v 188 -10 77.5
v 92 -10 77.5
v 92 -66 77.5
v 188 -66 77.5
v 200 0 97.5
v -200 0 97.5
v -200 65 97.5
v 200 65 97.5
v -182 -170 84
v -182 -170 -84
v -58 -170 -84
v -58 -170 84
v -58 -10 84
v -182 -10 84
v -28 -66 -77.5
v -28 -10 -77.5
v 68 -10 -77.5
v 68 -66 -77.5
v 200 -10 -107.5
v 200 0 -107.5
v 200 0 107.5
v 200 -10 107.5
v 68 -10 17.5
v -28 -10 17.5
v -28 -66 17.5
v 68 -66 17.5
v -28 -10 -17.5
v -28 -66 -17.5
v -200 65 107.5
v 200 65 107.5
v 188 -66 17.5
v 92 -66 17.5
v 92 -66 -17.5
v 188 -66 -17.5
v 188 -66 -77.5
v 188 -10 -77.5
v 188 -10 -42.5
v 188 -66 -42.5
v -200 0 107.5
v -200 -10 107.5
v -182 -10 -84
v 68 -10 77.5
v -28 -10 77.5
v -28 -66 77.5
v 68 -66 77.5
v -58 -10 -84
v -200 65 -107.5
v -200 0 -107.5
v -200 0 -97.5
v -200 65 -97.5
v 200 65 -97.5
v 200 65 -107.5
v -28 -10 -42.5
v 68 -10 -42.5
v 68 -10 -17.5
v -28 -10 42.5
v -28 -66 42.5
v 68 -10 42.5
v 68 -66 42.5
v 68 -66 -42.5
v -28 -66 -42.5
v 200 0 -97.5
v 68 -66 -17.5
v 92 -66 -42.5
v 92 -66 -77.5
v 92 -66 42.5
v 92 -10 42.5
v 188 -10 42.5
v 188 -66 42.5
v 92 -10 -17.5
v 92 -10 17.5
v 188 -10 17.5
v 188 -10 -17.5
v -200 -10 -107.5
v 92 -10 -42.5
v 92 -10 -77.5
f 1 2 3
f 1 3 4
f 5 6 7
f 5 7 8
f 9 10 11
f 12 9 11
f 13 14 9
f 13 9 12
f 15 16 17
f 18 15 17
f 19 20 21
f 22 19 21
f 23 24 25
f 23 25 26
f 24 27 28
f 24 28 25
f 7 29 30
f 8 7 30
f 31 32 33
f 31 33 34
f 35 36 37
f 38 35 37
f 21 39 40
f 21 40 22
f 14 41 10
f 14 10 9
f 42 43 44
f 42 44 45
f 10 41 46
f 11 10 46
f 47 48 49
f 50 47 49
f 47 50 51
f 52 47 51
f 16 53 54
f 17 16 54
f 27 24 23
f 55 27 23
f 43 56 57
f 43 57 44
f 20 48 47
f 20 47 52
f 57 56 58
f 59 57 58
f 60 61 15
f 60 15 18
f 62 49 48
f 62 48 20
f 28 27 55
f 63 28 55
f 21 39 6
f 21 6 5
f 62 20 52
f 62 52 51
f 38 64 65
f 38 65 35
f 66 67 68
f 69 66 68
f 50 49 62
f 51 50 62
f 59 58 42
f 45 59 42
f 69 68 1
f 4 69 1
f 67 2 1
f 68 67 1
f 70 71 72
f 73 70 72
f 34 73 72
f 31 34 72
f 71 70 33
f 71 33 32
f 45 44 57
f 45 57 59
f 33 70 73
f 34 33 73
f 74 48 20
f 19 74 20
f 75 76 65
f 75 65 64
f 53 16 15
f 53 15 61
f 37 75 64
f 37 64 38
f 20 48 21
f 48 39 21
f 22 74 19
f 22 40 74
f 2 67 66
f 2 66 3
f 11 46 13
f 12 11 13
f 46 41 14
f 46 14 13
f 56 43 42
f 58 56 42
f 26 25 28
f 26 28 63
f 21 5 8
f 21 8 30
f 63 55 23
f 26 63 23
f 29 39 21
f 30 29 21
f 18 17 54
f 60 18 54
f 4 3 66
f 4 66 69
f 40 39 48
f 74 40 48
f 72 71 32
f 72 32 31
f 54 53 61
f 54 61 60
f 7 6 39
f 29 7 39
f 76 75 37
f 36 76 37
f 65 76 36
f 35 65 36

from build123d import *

# Parameters (mm, degrees)
F1_W     = 400
F1_H     = 10
F1_H_2   = 195
F2_DEPTH = 10
F3_DEPTH = 65
F4_W     = 124
F4_H     = 168
F5_DEPTH = 160
F4_W_2   = 96
F4_H_2   = 35
F6_DEPTH = 56


with BuildPart() as f2:
    # F1 (on Front) → F2 (new body)
    with BuildSketch(Plane.XZ):
        with Locations((0, -102.5)):
            Rectangle(F1_W, F1_H)
        Rectangle(F1_W, F1_H_2)
        with Locations((0, 102.5)):
            Rectangle(F1_W, F1_H)
    extrude(amount=F2_DEPTH)


with BuildPart() as f3:
    # F1 (on Front) → F3 (new body)
    with BuildSketch(Plane.XZ):
        with Locations((0, 102.5)):
            Rectangle(F1_W, F1_H)
        with Locations((0, -102.5)):
            Rectangle(F1_W, F1_H)
    extrude(amount=-F3_DEPTH)


with BuildPart() as f5:
    # F4 (on face) → F5 (new body)
    with BuildSketch(Plane.XZ.offset(10)):
        with Locations((-120, 0)):
            Rectangle(F4_W, F4_H)
    extrude(amount=F5_DEPTH)


with BuildPart() as f6:
    # F4 (on face) → F6 (new body)
    with BuildSketch(Plane.XZ.offset(10)):
        with Locations((20, 60)):
            Rectangle(F4_W_2, F4_H_2)
        with Locations((20, 0)):
            Rectangle(F4_W_2, F4_H_2)
        with Locations((20, -60)):
            Rectangle(F4_W_2, F4_H_2)
        with Locations((140, 60)):
            Rectangle(F4_W_2, F4_H_2)
        with Locations((140, 0)):
            Rectangle(F4_W_2, F4_H_2)
        with Locations((140, -60)):
            Rectangle(F4_W_2, F4_H_2)
    extrude(amount=F6_DEPTH)


solid = Compound([f2.part, f3.part, f5.part, f6.part])
